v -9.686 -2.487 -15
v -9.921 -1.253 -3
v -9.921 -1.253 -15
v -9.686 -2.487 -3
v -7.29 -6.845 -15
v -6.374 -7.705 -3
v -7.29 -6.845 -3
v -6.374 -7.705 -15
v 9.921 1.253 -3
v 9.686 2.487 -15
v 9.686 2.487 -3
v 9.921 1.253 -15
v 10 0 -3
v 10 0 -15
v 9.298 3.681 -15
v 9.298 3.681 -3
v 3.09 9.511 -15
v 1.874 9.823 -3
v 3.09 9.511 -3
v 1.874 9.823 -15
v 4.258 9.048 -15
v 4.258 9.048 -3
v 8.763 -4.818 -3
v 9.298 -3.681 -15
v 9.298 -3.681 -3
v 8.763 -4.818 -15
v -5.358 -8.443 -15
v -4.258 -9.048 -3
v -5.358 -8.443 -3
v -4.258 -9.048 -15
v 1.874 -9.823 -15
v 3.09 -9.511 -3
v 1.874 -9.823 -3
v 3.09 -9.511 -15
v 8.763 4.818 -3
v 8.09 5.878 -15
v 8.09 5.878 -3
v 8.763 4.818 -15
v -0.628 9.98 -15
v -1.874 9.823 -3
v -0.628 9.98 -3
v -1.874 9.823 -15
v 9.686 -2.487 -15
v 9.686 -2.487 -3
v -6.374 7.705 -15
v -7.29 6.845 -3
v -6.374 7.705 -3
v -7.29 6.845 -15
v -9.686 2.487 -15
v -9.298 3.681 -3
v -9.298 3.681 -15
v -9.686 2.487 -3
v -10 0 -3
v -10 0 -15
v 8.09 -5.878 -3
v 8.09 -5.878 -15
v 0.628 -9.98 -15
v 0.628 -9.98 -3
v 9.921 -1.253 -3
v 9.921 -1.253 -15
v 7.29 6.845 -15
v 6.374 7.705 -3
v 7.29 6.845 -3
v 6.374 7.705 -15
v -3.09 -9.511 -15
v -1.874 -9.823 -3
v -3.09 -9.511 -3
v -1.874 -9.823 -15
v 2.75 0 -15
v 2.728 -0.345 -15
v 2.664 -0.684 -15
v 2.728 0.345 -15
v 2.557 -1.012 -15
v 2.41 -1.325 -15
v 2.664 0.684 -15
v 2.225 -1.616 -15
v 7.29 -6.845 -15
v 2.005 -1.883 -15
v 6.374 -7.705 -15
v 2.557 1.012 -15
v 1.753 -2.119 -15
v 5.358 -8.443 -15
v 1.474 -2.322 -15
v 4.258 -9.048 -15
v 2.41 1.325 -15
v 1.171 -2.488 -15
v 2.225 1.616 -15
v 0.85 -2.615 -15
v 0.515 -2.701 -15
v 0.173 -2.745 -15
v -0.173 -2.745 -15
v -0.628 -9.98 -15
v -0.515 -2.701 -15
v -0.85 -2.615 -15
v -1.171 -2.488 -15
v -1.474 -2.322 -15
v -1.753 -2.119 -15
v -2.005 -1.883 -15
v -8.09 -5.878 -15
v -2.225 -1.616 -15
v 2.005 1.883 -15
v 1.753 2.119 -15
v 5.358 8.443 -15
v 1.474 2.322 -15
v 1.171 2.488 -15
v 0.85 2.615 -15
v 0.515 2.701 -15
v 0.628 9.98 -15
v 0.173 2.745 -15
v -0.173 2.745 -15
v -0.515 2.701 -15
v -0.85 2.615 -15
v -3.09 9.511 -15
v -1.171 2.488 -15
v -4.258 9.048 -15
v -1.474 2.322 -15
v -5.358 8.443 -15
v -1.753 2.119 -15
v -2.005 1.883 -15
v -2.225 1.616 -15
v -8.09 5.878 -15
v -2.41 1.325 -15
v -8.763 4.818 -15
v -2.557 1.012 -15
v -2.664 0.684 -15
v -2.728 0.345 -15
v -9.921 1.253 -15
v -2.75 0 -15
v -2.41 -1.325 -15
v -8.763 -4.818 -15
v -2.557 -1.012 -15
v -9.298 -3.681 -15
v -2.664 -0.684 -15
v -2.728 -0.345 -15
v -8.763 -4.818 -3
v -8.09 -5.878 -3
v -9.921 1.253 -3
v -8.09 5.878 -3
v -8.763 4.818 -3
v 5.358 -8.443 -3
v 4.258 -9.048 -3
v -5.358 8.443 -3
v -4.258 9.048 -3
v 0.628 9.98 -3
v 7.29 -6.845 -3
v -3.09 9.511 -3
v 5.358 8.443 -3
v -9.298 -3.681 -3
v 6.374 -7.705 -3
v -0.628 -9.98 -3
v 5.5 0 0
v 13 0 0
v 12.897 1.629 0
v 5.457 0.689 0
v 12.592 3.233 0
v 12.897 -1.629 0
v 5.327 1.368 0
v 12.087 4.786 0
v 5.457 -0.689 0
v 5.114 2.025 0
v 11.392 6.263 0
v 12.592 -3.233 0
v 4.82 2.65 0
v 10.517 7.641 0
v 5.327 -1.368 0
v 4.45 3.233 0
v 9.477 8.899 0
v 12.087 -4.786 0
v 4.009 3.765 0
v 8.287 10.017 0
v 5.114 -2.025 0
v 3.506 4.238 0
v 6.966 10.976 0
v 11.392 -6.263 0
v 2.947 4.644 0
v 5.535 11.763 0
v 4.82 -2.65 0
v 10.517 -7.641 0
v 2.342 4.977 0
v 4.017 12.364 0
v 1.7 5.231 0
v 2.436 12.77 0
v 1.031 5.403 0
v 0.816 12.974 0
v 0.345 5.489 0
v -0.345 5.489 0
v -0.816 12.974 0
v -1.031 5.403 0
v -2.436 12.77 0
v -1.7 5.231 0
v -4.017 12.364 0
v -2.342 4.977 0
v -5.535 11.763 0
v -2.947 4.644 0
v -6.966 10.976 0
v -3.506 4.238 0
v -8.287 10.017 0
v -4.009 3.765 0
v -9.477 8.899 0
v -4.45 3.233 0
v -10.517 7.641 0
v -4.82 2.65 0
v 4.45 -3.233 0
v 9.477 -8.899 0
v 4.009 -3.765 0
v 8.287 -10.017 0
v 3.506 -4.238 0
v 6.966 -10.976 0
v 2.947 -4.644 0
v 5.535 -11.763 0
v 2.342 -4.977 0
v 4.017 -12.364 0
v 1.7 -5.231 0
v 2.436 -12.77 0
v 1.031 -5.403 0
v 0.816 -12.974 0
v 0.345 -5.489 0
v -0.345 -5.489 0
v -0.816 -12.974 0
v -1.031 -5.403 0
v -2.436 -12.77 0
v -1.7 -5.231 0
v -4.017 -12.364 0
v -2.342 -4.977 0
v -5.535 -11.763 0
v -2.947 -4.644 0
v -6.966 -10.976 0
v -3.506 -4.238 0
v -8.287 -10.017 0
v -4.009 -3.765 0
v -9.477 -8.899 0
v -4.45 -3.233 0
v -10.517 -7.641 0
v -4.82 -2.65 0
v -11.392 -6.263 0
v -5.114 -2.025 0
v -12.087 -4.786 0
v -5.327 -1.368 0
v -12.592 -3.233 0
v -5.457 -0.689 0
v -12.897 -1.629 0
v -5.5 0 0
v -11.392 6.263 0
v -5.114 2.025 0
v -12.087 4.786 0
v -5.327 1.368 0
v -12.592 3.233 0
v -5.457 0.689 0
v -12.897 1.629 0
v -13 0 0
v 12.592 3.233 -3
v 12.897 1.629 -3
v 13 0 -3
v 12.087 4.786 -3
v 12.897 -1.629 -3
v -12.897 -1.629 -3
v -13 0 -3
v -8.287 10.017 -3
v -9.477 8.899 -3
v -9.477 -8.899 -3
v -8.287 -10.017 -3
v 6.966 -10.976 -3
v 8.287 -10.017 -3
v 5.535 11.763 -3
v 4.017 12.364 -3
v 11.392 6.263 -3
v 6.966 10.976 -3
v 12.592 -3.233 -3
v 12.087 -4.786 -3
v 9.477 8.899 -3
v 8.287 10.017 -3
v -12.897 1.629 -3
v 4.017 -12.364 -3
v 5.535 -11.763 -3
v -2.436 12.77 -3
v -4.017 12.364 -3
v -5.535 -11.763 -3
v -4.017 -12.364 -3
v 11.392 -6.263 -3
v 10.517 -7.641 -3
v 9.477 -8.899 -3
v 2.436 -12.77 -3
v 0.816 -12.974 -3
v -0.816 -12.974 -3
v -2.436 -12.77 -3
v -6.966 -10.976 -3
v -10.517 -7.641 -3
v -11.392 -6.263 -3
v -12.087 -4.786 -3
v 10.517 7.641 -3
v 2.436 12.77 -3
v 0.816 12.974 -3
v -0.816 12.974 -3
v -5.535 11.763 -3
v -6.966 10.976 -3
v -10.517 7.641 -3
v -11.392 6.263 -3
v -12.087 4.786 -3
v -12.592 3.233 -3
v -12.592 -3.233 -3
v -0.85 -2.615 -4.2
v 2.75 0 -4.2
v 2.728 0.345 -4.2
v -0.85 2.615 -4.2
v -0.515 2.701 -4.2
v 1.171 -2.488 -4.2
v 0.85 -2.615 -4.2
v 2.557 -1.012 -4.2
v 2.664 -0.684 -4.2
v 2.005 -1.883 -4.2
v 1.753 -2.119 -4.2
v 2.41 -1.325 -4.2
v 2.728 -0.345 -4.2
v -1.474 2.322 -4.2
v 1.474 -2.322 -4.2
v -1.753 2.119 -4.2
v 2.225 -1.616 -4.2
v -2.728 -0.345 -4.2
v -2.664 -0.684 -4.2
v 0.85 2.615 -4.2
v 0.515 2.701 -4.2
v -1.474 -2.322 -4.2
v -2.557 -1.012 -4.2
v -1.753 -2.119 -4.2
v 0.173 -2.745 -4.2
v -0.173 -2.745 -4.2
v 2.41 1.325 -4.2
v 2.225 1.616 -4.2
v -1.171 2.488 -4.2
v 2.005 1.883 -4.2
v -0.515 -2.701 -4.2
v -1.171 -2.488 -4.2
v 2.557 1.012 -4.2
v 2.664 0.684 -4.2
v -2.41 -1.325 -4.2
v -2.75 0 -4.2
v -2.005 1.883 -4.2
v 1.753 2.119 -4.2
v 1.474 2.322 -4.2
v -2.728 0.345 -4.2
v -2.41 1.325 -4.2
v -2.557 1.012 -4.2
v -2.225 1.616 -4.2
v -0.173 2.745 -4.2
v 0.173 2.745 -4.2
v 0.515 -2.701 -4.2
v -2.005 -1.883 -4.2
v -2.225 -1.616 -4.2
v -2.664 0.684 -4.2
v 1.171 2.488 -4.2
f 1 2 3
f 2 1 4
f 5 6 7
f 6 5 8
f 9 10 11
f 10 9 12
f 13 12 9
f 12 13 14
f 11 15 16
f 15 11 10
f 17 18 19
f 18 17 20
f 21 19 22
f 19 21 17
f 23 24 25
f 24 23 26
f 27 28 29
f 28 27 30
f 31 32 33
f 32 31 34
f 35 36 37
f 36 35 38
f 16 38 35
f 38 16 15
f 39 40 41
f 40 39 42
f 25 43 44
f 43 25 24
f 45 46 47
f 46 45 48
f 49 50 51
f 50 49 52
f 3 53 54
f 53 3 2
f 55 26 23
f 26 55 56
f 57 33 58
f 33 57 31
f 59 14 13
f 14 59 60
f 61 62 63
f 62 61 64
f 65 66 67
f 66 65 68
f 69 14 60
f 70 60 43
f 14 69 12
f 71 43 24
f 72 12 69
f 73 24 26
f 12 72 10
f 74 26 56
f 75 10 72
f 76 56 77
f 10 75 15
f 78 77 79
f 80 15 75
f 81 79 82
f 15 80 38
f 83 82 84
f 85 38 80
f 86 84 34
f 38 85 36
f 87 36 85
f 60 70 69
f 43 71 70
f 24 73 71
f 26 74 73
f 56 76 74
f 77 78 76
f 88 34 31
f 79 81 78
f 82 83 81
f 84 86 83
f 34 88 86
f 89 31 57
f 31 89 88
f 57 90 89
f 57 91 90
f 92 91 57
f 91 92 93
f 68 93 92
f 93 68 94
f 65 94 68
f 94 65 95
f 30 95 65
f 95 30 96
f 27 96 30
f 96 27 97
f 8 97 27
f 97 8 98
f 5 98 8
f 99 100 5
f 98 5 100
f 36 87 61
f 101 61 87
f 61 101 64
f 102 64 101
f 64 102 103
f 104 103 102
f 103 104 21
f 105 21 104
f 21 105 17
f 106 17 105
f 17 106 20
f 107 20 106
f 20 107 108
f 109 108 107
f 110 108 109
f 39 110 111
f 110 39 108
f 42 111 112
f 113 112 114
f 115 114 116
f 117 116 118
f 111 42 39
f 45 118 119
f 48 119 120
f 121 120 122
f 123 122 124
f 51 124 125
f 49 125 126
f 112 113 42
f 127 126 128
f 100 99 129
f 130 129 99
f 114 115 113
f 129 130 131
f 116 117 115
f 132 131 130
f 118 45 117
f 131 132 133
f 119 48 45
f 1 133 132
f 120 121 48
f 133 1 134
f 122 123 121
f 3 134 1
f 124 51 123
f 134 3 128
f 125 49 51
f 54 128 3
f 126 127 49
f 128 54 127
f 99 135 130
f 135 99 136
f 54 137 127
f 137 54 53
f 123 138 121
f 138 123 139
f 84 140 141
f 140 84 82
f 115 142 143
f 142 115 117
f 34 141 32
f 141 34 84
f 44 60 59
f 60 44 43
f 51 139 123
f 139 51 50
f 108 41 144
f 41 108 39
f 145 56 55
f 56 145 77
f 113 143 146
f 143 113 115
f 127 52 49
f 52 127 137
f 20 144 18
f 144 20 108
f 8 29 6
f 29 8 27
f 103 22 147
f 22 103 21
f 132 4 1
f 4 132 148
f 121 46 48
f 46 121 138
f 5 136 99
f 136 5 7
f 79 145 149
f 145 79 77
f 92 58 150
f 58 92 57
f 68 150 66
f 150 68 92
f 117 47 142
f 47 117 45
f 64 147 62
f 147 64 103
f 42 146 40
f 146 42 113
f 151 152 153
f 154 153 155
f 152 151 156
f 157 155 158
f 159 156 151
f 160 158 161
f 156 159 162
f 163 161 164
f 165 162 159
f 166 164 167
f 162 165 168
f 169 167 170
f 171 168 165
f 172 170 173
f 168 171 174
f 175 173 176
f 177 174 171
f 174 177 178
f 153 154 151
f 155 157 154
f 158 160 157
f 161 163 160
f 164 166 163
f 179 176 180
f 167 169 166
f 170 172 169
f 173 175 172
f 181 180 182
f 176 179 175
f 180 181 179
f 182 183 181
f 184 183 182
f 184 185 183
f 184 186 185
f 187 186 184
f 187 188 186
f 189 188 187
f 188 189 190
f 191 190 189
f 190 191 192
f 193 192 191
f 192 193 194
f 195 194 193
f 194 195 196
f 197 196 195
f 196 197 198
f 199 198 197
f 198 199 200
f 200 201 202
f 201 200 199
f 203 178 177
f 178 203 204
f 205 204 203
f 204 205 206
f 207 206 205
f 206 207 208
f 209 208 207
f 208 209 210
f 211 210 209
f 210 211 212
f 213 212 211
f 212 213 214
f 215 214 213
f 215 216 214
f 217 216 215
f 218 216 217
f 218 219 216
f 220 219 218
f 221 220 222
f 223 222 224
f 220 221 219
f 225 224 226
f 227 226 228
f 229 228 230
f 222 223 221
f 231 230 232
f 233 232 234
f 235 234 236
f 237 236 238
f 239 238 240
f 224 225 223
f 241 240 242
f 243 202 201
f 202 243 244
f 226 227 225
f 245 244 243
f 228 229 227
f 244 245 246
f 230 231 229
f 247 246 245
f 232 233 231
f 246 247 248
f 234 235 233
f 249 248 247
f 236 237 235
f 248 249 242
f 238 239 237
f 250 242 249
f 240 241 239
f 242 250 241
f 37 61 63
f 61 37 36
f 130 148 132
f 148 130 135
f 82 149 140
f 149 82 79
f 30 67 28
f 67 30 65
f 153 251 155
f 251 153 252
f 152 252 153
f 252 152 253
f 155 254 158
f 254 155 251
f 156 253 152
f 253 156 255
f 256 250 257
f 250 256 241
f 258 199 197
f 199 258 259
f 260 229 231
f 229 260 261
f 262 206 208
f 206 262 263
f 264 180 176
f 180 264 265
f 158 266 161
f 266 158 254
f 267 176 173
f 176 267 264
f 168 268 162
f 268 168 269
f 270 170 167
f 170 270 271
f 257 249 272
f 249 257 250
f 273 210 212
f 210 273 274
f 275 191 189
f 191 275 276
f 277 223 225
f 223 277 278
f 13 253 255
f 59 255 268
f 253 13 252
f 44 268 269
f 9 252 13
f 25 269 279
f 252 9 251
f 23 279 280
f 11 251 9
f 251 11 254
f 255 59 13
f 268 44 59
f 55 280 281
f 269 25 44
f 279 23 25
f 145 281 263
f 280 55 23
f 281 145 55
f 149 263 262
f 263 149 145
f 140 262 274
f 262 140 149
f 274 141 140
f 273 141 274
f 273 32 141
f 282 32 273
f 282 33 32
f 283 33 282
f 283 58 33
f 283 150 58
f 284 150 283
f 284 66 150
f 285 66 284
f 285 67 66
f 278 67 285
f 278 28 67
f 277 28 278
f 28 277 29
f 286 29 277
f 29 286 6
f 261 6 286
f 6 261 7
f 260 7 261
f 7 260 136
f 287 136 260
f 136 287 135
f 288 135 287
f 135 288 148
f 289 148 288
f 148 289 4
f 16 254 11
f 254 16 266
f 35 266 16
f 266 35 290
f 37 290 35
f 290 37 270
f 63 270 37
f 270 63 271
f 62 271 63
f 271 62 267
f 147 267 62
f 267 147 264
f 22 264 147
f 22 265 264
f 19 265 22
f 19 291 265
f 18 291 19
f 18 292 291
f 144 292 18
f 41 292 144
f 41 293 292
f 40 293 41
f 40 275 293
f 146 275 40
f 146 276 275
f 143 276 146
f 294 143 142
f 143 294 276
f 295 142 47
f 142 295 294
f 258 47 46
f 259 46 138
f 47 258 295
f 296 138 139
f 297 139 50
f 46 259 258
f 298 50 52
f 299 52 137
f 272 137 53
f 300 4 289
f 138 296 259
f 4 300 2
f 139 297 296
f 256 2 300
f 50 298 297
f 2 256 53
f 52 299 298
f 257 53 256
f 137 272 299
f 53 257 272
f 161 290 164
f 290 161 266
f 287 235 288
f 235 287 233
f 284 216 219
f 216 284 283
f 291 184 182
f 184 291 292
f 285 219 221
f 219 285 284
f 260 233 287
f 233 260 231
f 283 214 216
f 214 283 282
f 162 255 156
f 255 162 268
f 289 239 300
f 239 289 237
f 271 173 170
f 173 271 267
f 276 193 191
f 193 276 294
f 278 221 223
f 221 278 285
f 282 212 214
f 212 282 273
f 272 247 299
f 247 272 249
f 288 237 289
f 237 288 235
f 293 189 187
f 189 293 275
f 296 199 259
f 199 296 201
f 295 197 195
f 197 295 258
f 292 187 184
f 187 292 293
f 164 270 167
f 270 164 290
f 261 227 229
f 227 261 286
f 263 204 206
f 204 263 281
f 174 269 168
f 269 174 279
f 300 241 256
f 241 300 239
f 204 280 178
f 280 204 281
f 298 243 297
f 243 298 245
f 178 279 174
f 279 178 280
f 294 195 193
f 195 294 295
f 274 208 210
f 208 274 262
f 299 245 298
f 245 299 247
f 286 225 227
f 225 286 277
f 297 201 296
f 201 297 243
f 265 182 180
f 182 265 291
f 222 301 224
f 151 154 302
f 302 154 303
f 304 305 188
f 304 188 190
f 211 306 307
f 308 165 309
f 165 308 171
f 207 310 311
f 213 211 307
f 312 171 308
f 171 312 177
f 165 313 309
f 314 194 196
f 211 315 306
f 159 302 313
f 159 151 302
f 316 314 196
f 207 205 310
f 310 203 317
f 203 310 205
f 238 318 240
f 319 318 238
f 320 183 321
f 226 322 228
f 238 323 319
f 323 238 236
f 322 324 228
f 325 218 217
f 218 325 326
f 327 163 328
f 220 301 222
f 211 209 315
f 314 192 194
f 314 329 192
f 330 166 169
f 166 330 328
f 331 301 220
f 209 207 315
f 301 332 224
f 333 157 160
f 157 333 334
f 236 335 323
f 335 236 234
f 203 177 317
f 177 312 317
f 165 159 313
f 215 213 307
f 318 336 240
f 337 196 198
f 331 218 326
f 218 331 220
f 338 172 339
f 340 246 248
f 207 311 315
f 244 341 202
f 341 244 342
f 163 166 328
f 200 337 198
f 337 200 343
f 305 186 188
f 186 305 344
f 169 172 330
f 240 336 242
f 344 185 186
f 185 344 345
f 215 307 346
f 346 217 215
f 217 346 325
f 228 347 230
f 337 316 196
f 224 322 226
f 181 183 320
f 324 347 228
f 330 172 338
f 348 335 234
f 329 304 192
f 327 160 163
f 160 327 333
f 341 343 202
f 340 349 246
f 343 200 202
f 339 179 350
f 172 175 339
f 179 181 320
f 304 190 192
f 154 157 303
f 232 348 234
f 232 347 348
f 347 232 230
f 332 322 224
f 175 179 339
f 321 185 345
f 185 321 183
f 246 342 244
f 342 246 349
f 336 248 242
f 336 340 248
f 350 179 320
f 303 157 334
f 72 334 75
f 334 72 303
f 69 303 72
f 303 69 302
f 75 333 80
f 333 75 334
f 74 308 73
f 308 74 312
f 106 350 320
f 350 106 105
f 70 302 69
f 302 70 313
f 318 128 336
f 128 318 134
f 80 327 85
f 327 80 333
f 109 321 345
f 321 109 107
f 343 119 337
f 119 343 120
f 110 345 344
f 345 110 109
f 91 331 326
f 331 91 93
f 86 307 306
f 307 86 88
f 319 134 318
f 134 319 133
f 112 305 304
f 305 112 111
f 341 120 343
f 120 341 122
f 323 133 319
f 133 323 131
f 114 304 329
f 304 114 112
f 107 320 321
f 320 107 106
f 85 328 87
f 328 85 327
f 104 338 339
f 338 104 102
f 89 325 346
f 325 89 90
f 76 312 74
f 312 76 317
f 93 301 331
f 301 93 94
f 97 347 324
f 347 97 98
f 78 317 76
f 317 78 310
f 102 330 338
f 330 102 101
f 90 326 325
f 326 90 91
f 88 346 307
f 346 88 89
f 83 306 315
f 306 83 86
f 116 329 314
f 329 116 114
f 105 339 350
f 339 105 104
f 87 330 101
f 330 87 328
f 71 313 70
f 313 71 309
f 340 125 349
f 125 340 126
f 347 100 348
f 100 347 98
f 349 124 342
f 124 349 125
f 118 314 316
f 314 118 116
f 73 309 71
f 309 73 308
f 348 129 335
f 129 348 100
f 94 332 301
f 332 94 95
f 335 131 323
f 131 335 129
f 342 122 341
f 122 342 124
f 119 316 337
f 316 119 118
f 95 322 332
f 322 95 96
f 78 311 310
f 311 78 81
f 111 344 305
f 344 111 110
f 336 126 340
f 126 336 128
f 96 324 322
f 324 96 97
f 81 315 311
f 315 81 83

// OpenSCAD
$fn = 50;


difference() {
	union() {
		translate(v = [0, 0, -15.0000000000]) {
			cylinder(h = 15, r = 10.0000000000);
		}
		translate(v = [0, 0, -3.0000000000]) {
			cylinder(h = 3, r = 13.0000000000);
		}
	}
	union() {
		translate(v = [0, 0, 0]) {
			rotate(a = [0, 0, 0]) {
				difference() {
					union() {
						#translate(v = [0, 0, -15.0000000000]) {
							cylinder(h = 15, r = 2.2500000000);
						}
						#translate(v = [0, 0, -4.2000000000]) {
							cylinder(h = 4.2000000000, r = 10.0000000000, r1 = 2.7500000000, r2 = 5.5000000000);
						}
						#translate(v = [0, 0, -15.0000000000]) {
							cylinder(h = 15, r = 2.7500000000);
						}
						#translate(v = [0, 0, -15.0000000000]) {
							cylinder(h = 15, r = 2.2500000000);
						}
					}
					union();
				}
			}
		}
	}
}
